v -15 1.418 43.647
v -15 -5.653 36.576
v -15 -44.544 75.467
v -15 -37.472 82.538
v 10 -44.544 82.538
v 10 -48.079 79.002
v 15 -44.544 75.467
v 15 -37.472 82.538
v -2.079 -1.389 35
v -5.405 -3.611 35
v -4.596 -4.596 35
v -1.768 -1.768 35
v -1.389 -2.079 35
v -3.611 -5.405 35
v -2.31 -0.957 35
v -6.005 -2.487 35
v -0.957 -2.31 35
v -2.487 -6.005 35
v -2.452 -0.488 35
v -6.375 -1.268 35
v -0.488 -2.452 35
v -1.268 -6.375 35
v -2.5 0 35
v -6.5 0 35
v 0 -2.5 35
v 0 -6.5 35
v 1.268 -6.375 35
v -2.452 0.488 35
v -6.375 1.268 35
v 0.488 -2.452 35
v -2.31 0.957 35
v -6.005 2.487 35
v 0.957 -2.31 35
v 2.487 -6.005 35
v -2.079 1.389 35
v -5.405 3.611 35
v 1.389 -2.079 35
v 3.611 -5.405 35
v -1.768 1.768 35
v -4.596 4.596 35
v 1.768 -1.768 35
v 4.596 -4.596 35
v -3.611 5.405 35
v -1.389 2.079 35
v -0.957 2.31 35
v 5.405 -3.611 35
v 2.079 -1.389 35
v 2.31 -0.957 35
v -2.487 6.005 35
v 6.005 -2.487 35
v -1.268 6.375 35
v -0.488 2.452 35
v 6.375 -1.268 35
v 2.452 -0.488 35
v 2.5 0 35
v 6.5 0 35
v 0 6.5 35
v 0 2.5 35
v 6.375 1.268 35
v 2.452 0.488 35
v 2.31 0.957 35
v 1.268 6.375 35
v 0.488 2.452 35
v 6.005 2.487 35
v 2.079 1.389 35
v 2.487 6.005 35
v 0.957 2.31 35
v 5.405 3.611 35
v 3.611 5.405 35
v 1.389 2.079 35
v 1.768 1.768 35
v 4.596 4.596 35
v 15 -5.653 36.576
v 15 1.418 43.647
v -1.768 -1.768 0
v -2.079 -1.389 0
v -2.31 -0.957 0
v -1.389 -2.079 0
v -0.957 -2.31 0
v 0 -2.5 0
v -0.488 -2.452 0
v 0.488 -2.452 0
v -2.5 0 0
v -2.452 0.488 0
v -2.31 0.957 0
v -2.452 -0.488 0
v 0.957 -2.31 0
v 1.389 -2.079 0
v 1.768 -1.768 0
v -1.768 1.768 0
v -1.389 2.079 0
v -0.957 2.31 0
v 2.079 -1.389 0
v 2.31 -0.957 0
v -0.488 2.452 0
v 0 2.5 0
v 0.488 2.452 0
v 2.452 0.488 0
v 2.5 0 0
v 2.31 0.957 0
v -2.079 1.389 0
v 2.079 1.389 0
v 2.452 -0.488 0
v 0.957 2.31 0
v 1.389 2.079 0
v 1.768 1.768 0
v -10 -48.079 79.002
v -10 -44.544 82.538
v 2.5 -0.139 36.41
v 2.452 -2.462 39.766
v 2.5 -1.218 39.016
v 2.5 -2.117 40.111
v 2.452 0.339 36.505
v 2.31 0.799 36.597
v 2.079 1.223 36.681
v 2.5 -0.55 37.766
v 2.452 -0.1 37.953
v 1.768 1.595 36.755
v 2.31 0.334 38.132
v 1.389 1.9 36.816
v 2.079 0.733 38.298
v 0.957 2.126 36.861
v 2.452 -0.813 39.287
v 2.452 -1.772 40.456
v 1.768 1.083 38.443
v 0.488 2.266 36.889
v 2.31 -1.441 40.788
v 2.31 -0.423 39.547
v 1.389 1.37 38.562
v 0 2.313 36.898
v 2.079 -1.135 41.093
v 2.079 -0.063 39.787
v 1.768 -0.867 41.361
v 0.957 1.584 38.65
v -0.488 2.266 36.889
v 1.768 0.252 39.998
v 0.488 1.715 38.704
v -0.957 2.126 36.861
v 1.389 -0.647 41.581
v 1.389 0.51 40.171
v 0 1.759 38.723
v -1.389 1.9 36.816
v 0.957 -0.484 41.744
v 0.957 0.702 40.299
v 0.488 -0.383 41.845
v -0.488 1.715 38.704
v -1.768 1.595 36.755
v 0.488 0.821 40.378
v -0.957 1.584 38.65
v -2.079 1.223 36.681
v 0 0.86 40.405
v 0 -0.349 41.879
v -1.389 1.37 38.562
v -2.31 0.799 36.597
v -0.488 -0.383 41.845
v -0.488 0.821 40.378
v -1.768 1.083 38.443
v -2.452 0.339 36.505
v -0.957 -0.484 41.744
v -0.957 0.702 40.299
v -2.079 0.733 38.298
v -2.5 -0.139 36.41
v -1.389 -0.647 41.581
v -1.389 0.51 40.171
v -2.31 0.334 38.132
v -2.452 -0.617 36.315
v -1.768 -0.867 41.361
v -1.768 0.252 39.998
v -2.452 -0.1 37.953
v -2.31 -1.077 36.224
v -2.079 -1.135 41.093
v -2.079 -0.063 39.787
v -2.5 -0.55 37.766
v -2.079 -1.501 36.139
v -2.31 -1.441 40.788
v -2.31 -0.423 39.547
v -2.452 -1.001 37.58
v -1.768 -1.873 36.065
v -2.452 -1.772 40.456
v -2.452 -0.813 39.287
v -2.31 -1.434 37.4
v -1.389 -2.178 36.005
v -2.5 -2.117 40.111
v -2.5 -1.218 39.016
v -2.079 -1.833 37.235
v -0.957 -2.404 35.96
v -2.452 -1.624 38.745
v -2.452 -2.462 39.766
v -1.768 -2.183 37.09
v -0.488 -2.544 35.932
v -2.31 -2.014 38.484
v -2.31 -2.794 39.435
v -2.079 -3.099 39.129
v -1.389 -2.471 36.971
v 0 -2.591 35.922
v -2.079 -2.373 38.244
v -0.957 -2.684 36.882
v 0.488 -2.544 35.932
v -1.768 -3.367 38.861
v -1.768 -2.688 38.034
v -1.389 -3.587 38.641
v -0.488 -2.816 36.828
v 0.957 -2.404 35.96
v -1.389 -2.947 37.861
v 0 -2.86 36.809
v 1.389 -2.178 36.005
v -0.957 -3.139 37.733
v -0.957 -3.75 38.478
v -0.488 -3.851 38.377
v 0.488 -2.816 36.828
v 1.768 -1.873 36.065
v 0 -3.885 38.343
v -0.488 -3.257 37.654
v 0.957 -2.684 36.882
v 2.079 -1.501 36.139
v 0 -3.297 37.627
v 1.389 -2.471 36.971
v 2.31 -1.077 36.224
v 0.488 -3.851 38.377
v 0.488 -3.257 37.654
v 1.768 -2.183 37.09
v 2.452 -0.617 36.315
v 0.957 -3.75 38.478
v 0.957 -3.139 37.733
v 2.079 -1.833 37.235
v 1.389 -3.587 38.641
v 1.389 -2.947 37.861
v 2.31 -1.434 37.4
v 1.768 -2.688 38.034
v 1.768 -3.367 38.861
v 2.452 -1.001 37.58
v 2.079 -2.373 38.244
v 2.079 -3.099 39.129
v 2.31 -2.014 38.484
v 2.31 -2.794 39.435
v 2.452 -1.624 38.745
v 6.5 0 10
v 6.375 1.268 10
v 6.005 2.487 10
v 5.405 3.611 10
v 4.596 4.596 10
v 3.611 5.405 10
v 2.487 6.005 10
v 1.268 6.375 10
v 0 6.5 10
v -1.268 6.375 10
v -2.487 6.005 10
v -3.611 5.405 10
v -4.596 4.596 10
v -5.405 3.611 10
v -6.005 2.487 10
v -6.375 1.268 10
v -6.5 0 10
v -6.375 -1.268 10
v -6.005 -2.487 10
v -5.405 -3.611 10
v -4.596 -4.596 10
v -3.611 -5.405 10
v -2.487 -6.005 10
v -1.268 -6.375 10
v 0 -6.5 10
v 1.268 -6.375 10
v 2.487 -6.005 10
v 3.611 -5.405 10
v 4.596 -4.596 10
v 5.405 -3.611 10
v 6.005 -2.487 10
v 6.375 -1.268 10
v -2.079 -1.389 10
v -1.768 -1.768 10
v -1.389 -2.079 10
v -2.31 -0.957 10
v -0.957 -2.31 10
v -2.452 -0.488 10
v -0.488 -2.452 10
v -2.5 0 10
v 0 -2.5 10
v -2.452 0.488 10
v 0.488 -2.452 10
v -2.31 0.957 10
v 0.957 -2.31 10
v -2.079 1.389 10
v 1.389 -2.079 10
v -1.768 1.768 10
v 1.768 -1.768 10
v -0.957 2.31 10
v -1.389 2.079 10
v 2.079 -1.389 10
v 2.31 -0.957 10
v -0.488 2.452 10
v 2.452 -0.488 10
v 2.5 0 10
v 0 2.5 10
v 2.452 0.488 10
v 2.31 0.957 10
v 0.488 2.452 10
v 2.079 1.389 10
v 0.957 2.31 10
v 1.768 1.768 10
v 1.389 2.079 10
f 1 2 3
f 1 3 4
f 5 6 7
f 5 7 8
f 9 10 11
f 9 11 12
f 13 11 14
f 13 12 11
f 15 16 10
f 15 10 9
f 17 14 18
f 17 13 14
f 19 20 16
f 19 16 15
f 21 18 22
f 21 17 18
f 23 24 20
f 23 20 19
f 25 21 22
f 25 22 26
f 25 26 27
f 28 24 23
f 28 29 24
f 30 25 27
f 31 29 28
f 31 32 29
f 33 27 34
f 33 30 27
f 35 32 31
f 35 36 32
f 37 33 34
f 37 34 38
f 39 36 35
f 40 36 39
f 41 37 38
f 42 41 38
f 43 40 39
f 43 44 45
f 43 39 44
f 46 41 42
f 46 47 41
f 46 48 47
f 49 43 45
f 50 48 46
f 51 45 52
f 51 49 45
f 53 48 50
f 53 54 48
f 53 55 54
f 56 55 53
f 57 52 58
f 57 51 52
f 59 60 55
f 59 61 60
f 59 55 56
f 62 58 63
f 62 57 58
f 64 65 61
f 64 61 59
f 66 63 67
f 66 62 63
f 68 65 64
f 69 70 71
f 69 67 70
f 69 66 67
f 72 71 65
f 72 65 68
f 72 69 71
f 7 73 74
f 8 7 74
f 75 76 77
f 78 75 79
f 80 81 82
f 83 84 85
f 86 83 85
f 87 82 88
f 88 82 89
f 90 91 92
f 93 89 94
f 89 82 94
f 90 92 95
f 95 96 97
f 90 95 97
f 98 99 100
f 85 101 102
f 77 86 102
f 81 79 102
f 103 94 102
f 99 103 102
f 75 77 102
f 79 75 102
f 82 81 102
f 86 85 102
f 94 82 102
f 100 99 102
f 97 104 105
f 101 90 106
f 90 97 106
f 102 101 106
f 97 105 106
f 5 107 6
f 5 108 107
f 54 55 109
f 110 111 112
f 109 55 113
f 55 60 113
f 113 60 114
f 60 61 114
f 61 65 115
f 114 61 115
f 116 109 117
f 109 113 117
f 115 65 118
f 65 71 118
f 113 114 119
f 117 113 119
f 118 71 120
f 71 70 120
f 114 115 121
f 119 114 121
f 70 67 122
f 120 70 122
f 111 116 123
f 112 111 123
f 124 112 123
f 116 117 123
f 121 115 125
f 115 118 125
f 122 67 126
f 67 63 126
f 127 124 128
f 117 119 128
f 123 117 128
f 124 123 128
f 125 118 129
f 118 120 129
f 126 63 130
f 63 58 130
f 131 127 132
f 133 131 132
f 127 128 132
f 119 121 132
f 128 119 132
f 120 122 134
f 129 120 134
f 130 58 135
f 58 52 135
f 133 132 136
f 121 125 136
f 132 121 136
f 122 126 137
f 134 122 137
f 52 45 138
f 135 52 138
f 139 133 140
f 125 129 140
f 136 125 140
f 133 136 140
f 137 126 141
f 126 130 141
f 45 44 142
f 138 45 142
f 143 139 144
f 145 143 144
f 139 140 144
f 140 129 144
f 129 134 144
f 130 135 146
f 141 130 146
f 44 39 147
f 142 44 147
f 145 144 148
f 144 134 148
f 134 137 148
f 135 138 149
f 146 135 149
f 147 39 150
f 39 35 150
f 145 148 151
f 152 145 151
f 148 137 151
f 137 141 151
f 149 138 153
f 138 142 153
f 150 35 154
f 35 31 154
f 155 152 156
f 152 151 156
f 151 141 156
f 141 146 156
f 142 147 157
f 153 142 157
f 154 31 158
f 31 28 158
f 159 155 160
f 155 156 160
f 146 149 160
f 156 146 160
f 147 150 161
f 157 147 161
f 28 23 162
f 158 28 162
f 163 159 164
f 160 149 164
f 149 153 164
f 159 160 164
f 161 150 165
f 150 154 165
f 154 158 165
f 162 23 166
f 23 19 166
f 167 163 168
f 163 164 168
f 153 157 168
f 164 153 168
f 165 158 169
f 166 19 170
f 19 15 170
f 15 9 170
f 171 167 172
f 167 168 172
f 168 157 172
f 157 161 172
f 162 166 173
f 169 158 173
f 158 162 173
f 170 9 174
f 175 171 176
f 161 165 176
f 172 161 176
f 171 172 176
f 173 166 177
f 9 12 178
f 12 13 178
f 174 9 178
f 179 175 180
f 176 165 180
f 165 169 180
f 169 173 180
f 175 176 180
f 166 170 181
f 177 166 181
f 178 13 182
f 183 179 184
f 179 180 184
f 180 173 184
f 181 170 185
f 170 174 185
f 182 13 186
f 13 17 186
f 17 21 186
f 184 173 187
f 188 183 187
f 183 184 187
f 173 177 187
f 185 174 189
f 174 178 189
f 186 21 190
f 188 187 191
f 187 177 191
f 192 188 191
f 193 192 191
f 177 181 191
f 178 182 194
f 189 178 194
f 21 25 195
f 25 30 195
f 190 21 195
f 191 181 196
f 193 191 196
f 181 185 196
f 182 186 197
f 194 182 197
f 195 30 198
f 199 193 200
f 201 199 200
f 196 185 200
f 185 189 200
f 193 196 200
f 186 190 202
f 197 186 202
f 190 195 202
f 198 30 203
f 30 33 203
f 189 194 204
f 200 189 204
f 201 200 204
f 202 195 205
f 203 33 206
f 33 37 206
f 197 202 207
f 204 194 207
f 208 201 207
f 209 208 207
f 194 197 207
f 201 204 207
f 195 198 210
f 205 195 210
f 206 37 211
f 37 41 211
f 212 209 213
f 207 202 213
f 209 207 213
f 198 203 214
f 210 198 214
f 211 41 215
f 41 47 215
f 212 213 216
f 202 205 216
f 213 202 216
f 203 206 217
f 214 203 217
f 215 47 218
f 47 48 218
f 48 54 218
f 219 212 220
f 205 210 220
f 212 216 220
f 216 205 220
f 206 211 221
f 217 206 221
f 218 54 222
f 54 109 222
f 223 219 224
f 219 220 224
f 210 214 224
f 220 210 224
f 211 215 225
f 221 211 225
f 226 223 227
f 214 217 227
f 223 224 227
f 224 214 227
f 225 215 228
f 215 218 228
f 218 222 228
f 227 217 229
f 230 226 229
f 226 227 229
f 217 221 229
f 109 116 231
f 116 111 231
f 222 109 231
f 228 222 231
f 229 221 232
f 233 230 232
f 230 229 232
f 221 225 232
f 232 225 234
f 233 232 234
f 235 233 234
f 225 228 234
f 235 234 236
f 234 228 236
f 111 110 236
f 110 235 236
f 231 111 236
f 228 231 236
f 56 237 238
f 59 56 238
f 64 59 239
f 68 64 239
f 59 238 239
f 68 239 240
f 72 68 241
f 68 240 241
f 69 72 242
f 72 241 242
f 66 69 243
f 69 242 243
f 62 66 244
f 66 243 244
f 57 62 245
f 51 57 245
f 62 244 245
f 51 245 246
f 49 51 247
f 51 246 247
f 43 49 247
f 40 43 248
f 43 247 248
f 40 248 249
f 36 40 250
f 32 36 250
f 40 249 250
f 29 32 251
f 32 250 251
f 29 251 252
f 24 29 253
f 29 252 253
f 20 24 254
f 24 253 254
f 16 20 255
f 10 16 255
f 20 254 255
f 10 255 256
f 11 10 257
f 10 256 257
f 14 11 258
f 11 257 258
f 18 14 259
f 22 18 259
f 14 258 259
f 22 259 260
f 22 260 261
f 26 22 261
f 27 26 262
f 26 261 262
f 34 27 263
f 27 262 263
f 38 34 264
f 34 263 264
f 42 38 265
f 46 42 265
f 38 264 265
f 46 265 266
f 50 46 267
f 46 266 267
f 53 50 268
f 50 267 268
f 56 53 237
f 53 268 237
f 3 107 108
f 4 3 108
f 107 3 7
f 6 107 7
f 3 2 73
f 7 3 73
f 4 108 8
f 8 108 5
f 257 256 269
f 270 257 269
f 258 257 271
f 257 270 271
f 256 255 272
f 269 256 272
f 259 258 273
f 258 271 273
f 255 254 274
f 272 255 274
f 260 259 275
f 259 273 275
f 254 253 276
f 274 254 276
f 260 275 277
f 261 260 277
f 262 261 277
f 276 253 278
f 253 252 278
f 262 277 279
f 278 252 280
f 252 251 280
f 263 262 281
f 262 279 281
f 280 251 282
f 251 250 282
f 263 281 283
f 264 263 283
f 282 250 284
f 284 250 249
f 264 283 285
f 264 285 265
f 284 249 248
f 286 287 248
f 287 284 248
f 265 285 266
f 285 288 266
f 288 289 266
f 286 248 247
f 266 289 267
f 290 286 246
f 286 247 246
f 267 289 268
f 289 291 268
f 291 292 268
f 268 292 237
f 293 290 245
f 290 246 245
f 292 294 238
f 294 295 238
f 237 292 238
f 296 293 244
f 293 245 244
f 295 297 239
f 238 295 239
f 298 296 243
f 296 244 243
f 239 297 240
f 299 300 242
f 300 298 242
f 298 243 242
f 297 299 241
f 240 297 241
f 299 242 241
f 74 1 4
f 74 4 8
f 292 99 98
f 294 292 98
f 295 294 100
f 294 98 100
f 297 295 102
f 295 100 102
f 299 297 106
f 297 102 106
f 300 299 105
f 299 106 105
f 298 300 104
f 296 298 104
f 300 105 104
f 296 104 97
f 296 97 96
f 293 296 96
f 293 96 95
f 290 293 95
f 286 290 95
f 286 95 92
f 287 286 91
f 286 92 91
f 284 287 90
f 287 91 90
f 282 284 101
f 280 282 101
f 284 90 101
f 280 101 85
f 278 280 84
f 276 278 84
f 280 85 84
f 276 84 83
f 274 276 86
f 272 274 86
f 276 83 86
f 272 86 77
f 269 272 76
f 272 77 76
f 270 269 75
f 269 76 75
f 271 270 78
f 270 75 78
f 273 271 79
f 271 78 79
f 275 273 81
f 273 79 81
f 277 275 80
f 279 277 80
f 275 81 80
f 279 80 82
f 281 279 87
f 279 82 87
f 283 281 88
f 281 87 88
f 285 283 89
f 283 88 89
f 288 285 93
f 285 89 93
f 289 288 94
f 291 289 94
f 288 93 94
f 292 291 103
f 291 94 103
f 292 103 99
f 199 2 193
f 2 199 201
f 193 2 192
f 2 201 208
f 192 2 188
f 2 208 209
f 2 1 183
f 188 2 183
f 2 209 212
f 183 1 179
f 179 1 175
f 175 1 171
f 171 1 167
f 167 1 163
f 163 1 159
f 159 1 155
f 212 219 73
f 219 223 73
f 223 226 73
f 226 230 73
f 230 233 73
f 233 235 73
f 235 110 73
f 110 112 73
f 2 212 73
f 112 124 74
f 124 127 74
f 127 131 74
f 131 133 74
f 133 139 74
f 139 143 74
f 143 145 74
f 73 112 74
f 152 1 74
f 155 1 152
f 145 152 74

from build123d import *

# Parameters (mm, degrees)
F0_R     = 2.5
F1_DEPTH = 10
F2_R     = 6.5
F2_R_2   = 2.5
F3_DEPTH = 25
F4_R     = 2.5
F5_ANGLE = 45
F6_W     = 30
F6_H     = 10
F6_R     = 2.5
F7_DEPTH = 60
F8_SIZE2 = 5
F8_SIZE  = 5


with BuildPart() as f1:
    # F0 (on Top) → F1 (new body)
    with BuildSketch(Plane.XY):
        Circle(F0_R)
    extrude(amount=F1_DEPTH)

    # F2 (on face) → F3 (join)
    with BuildSketch(Plane.XY.offset(10)):
        Circle(F2_R)
        Circle(F2_R_2, mode=Mode.SUBTRACT)
        Circle(F2_R_2)
    extrude(amount=F3_DEPTH)

    # F4 (on face) → F5 (revolve)
    with BuildSketch(Plane.XY.offset(35)):
        Circle(F4_R)
    revolve(axis=Axis((1.7774057342, -7.2282995097, 35), (1, 0, 0)), revolution_arc=F5_ANGLE)

    # F6 (on face) → F7 (join)
    with BuildSketch(Plane(origin=(0, -21.1141497549, 21.1141497549), x_dir=(1, 0, 0), z_dir=(0, -0.7071067812, 0.7071067812))):
        with Locations((0, 26.8658572515)):
            Rectangle(F6_W, F6_H)
        with Locations((0, 26.8658572515)):
            Circle(F6_R, mode=Mode.SUBTRACT)
        with Locations((0, 26.8658572515)):
            Circle(F6_R)
    extrude(amount=F7_DEPTH)

    # F8
    f8_edges = [f1.edges().sort_by_distance(p)[0] for p in [
        (0, -41.007993, 86.07312),
        (-15, -44.543527, 82.537586),
        (15, -44.543527, 82.537586),
    ]]
    chamfer(f8_edges, length=F8_SIZE, length2=F8_SIZE2)


solid = f1.part
